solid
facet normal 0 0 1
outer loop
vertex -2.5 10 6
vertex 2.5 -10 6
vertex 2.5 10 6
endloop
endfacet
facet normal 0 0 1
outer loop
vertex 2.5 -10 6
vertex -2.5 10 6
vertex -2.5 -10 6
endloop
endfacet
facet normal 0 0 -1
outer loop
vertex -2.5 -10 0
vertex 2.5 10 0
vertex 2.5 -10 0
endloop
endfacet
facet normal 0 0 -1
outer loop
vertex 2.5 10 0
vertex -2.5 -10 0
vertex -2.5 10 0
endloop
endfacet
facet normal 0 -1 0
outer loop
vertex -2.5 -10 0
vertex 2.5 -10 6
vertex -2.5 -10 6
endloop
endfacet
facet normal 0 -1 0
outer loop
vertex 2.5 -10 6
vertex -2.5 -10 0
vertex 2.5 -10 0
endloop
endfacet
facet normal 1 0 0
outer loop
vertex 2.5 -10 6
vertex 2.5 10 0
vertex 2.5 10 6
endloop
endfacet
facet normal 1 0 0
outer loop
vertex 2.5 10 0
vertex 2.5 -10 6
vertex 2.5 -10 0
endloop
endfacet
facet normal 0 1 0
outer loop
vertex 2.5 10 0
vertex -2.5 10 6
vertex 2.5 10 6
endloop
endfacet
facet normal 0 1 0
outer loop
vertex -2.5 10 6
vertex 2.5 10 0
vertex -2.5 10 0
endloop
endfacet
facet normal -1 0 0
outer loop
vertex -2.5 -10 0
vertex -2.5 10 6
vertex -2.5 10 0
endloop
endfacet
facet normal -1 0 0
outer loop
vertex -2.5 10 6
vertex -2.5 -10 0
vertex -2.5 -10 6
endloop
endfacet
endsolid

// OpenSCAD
// brick 1x4

// external vars

ext_scale = 1.0;

// part

scale([ext_scale,ext_scale,ext_scale])
translate([-2.5,-10,0])
cube([5,20,6],center=false);
